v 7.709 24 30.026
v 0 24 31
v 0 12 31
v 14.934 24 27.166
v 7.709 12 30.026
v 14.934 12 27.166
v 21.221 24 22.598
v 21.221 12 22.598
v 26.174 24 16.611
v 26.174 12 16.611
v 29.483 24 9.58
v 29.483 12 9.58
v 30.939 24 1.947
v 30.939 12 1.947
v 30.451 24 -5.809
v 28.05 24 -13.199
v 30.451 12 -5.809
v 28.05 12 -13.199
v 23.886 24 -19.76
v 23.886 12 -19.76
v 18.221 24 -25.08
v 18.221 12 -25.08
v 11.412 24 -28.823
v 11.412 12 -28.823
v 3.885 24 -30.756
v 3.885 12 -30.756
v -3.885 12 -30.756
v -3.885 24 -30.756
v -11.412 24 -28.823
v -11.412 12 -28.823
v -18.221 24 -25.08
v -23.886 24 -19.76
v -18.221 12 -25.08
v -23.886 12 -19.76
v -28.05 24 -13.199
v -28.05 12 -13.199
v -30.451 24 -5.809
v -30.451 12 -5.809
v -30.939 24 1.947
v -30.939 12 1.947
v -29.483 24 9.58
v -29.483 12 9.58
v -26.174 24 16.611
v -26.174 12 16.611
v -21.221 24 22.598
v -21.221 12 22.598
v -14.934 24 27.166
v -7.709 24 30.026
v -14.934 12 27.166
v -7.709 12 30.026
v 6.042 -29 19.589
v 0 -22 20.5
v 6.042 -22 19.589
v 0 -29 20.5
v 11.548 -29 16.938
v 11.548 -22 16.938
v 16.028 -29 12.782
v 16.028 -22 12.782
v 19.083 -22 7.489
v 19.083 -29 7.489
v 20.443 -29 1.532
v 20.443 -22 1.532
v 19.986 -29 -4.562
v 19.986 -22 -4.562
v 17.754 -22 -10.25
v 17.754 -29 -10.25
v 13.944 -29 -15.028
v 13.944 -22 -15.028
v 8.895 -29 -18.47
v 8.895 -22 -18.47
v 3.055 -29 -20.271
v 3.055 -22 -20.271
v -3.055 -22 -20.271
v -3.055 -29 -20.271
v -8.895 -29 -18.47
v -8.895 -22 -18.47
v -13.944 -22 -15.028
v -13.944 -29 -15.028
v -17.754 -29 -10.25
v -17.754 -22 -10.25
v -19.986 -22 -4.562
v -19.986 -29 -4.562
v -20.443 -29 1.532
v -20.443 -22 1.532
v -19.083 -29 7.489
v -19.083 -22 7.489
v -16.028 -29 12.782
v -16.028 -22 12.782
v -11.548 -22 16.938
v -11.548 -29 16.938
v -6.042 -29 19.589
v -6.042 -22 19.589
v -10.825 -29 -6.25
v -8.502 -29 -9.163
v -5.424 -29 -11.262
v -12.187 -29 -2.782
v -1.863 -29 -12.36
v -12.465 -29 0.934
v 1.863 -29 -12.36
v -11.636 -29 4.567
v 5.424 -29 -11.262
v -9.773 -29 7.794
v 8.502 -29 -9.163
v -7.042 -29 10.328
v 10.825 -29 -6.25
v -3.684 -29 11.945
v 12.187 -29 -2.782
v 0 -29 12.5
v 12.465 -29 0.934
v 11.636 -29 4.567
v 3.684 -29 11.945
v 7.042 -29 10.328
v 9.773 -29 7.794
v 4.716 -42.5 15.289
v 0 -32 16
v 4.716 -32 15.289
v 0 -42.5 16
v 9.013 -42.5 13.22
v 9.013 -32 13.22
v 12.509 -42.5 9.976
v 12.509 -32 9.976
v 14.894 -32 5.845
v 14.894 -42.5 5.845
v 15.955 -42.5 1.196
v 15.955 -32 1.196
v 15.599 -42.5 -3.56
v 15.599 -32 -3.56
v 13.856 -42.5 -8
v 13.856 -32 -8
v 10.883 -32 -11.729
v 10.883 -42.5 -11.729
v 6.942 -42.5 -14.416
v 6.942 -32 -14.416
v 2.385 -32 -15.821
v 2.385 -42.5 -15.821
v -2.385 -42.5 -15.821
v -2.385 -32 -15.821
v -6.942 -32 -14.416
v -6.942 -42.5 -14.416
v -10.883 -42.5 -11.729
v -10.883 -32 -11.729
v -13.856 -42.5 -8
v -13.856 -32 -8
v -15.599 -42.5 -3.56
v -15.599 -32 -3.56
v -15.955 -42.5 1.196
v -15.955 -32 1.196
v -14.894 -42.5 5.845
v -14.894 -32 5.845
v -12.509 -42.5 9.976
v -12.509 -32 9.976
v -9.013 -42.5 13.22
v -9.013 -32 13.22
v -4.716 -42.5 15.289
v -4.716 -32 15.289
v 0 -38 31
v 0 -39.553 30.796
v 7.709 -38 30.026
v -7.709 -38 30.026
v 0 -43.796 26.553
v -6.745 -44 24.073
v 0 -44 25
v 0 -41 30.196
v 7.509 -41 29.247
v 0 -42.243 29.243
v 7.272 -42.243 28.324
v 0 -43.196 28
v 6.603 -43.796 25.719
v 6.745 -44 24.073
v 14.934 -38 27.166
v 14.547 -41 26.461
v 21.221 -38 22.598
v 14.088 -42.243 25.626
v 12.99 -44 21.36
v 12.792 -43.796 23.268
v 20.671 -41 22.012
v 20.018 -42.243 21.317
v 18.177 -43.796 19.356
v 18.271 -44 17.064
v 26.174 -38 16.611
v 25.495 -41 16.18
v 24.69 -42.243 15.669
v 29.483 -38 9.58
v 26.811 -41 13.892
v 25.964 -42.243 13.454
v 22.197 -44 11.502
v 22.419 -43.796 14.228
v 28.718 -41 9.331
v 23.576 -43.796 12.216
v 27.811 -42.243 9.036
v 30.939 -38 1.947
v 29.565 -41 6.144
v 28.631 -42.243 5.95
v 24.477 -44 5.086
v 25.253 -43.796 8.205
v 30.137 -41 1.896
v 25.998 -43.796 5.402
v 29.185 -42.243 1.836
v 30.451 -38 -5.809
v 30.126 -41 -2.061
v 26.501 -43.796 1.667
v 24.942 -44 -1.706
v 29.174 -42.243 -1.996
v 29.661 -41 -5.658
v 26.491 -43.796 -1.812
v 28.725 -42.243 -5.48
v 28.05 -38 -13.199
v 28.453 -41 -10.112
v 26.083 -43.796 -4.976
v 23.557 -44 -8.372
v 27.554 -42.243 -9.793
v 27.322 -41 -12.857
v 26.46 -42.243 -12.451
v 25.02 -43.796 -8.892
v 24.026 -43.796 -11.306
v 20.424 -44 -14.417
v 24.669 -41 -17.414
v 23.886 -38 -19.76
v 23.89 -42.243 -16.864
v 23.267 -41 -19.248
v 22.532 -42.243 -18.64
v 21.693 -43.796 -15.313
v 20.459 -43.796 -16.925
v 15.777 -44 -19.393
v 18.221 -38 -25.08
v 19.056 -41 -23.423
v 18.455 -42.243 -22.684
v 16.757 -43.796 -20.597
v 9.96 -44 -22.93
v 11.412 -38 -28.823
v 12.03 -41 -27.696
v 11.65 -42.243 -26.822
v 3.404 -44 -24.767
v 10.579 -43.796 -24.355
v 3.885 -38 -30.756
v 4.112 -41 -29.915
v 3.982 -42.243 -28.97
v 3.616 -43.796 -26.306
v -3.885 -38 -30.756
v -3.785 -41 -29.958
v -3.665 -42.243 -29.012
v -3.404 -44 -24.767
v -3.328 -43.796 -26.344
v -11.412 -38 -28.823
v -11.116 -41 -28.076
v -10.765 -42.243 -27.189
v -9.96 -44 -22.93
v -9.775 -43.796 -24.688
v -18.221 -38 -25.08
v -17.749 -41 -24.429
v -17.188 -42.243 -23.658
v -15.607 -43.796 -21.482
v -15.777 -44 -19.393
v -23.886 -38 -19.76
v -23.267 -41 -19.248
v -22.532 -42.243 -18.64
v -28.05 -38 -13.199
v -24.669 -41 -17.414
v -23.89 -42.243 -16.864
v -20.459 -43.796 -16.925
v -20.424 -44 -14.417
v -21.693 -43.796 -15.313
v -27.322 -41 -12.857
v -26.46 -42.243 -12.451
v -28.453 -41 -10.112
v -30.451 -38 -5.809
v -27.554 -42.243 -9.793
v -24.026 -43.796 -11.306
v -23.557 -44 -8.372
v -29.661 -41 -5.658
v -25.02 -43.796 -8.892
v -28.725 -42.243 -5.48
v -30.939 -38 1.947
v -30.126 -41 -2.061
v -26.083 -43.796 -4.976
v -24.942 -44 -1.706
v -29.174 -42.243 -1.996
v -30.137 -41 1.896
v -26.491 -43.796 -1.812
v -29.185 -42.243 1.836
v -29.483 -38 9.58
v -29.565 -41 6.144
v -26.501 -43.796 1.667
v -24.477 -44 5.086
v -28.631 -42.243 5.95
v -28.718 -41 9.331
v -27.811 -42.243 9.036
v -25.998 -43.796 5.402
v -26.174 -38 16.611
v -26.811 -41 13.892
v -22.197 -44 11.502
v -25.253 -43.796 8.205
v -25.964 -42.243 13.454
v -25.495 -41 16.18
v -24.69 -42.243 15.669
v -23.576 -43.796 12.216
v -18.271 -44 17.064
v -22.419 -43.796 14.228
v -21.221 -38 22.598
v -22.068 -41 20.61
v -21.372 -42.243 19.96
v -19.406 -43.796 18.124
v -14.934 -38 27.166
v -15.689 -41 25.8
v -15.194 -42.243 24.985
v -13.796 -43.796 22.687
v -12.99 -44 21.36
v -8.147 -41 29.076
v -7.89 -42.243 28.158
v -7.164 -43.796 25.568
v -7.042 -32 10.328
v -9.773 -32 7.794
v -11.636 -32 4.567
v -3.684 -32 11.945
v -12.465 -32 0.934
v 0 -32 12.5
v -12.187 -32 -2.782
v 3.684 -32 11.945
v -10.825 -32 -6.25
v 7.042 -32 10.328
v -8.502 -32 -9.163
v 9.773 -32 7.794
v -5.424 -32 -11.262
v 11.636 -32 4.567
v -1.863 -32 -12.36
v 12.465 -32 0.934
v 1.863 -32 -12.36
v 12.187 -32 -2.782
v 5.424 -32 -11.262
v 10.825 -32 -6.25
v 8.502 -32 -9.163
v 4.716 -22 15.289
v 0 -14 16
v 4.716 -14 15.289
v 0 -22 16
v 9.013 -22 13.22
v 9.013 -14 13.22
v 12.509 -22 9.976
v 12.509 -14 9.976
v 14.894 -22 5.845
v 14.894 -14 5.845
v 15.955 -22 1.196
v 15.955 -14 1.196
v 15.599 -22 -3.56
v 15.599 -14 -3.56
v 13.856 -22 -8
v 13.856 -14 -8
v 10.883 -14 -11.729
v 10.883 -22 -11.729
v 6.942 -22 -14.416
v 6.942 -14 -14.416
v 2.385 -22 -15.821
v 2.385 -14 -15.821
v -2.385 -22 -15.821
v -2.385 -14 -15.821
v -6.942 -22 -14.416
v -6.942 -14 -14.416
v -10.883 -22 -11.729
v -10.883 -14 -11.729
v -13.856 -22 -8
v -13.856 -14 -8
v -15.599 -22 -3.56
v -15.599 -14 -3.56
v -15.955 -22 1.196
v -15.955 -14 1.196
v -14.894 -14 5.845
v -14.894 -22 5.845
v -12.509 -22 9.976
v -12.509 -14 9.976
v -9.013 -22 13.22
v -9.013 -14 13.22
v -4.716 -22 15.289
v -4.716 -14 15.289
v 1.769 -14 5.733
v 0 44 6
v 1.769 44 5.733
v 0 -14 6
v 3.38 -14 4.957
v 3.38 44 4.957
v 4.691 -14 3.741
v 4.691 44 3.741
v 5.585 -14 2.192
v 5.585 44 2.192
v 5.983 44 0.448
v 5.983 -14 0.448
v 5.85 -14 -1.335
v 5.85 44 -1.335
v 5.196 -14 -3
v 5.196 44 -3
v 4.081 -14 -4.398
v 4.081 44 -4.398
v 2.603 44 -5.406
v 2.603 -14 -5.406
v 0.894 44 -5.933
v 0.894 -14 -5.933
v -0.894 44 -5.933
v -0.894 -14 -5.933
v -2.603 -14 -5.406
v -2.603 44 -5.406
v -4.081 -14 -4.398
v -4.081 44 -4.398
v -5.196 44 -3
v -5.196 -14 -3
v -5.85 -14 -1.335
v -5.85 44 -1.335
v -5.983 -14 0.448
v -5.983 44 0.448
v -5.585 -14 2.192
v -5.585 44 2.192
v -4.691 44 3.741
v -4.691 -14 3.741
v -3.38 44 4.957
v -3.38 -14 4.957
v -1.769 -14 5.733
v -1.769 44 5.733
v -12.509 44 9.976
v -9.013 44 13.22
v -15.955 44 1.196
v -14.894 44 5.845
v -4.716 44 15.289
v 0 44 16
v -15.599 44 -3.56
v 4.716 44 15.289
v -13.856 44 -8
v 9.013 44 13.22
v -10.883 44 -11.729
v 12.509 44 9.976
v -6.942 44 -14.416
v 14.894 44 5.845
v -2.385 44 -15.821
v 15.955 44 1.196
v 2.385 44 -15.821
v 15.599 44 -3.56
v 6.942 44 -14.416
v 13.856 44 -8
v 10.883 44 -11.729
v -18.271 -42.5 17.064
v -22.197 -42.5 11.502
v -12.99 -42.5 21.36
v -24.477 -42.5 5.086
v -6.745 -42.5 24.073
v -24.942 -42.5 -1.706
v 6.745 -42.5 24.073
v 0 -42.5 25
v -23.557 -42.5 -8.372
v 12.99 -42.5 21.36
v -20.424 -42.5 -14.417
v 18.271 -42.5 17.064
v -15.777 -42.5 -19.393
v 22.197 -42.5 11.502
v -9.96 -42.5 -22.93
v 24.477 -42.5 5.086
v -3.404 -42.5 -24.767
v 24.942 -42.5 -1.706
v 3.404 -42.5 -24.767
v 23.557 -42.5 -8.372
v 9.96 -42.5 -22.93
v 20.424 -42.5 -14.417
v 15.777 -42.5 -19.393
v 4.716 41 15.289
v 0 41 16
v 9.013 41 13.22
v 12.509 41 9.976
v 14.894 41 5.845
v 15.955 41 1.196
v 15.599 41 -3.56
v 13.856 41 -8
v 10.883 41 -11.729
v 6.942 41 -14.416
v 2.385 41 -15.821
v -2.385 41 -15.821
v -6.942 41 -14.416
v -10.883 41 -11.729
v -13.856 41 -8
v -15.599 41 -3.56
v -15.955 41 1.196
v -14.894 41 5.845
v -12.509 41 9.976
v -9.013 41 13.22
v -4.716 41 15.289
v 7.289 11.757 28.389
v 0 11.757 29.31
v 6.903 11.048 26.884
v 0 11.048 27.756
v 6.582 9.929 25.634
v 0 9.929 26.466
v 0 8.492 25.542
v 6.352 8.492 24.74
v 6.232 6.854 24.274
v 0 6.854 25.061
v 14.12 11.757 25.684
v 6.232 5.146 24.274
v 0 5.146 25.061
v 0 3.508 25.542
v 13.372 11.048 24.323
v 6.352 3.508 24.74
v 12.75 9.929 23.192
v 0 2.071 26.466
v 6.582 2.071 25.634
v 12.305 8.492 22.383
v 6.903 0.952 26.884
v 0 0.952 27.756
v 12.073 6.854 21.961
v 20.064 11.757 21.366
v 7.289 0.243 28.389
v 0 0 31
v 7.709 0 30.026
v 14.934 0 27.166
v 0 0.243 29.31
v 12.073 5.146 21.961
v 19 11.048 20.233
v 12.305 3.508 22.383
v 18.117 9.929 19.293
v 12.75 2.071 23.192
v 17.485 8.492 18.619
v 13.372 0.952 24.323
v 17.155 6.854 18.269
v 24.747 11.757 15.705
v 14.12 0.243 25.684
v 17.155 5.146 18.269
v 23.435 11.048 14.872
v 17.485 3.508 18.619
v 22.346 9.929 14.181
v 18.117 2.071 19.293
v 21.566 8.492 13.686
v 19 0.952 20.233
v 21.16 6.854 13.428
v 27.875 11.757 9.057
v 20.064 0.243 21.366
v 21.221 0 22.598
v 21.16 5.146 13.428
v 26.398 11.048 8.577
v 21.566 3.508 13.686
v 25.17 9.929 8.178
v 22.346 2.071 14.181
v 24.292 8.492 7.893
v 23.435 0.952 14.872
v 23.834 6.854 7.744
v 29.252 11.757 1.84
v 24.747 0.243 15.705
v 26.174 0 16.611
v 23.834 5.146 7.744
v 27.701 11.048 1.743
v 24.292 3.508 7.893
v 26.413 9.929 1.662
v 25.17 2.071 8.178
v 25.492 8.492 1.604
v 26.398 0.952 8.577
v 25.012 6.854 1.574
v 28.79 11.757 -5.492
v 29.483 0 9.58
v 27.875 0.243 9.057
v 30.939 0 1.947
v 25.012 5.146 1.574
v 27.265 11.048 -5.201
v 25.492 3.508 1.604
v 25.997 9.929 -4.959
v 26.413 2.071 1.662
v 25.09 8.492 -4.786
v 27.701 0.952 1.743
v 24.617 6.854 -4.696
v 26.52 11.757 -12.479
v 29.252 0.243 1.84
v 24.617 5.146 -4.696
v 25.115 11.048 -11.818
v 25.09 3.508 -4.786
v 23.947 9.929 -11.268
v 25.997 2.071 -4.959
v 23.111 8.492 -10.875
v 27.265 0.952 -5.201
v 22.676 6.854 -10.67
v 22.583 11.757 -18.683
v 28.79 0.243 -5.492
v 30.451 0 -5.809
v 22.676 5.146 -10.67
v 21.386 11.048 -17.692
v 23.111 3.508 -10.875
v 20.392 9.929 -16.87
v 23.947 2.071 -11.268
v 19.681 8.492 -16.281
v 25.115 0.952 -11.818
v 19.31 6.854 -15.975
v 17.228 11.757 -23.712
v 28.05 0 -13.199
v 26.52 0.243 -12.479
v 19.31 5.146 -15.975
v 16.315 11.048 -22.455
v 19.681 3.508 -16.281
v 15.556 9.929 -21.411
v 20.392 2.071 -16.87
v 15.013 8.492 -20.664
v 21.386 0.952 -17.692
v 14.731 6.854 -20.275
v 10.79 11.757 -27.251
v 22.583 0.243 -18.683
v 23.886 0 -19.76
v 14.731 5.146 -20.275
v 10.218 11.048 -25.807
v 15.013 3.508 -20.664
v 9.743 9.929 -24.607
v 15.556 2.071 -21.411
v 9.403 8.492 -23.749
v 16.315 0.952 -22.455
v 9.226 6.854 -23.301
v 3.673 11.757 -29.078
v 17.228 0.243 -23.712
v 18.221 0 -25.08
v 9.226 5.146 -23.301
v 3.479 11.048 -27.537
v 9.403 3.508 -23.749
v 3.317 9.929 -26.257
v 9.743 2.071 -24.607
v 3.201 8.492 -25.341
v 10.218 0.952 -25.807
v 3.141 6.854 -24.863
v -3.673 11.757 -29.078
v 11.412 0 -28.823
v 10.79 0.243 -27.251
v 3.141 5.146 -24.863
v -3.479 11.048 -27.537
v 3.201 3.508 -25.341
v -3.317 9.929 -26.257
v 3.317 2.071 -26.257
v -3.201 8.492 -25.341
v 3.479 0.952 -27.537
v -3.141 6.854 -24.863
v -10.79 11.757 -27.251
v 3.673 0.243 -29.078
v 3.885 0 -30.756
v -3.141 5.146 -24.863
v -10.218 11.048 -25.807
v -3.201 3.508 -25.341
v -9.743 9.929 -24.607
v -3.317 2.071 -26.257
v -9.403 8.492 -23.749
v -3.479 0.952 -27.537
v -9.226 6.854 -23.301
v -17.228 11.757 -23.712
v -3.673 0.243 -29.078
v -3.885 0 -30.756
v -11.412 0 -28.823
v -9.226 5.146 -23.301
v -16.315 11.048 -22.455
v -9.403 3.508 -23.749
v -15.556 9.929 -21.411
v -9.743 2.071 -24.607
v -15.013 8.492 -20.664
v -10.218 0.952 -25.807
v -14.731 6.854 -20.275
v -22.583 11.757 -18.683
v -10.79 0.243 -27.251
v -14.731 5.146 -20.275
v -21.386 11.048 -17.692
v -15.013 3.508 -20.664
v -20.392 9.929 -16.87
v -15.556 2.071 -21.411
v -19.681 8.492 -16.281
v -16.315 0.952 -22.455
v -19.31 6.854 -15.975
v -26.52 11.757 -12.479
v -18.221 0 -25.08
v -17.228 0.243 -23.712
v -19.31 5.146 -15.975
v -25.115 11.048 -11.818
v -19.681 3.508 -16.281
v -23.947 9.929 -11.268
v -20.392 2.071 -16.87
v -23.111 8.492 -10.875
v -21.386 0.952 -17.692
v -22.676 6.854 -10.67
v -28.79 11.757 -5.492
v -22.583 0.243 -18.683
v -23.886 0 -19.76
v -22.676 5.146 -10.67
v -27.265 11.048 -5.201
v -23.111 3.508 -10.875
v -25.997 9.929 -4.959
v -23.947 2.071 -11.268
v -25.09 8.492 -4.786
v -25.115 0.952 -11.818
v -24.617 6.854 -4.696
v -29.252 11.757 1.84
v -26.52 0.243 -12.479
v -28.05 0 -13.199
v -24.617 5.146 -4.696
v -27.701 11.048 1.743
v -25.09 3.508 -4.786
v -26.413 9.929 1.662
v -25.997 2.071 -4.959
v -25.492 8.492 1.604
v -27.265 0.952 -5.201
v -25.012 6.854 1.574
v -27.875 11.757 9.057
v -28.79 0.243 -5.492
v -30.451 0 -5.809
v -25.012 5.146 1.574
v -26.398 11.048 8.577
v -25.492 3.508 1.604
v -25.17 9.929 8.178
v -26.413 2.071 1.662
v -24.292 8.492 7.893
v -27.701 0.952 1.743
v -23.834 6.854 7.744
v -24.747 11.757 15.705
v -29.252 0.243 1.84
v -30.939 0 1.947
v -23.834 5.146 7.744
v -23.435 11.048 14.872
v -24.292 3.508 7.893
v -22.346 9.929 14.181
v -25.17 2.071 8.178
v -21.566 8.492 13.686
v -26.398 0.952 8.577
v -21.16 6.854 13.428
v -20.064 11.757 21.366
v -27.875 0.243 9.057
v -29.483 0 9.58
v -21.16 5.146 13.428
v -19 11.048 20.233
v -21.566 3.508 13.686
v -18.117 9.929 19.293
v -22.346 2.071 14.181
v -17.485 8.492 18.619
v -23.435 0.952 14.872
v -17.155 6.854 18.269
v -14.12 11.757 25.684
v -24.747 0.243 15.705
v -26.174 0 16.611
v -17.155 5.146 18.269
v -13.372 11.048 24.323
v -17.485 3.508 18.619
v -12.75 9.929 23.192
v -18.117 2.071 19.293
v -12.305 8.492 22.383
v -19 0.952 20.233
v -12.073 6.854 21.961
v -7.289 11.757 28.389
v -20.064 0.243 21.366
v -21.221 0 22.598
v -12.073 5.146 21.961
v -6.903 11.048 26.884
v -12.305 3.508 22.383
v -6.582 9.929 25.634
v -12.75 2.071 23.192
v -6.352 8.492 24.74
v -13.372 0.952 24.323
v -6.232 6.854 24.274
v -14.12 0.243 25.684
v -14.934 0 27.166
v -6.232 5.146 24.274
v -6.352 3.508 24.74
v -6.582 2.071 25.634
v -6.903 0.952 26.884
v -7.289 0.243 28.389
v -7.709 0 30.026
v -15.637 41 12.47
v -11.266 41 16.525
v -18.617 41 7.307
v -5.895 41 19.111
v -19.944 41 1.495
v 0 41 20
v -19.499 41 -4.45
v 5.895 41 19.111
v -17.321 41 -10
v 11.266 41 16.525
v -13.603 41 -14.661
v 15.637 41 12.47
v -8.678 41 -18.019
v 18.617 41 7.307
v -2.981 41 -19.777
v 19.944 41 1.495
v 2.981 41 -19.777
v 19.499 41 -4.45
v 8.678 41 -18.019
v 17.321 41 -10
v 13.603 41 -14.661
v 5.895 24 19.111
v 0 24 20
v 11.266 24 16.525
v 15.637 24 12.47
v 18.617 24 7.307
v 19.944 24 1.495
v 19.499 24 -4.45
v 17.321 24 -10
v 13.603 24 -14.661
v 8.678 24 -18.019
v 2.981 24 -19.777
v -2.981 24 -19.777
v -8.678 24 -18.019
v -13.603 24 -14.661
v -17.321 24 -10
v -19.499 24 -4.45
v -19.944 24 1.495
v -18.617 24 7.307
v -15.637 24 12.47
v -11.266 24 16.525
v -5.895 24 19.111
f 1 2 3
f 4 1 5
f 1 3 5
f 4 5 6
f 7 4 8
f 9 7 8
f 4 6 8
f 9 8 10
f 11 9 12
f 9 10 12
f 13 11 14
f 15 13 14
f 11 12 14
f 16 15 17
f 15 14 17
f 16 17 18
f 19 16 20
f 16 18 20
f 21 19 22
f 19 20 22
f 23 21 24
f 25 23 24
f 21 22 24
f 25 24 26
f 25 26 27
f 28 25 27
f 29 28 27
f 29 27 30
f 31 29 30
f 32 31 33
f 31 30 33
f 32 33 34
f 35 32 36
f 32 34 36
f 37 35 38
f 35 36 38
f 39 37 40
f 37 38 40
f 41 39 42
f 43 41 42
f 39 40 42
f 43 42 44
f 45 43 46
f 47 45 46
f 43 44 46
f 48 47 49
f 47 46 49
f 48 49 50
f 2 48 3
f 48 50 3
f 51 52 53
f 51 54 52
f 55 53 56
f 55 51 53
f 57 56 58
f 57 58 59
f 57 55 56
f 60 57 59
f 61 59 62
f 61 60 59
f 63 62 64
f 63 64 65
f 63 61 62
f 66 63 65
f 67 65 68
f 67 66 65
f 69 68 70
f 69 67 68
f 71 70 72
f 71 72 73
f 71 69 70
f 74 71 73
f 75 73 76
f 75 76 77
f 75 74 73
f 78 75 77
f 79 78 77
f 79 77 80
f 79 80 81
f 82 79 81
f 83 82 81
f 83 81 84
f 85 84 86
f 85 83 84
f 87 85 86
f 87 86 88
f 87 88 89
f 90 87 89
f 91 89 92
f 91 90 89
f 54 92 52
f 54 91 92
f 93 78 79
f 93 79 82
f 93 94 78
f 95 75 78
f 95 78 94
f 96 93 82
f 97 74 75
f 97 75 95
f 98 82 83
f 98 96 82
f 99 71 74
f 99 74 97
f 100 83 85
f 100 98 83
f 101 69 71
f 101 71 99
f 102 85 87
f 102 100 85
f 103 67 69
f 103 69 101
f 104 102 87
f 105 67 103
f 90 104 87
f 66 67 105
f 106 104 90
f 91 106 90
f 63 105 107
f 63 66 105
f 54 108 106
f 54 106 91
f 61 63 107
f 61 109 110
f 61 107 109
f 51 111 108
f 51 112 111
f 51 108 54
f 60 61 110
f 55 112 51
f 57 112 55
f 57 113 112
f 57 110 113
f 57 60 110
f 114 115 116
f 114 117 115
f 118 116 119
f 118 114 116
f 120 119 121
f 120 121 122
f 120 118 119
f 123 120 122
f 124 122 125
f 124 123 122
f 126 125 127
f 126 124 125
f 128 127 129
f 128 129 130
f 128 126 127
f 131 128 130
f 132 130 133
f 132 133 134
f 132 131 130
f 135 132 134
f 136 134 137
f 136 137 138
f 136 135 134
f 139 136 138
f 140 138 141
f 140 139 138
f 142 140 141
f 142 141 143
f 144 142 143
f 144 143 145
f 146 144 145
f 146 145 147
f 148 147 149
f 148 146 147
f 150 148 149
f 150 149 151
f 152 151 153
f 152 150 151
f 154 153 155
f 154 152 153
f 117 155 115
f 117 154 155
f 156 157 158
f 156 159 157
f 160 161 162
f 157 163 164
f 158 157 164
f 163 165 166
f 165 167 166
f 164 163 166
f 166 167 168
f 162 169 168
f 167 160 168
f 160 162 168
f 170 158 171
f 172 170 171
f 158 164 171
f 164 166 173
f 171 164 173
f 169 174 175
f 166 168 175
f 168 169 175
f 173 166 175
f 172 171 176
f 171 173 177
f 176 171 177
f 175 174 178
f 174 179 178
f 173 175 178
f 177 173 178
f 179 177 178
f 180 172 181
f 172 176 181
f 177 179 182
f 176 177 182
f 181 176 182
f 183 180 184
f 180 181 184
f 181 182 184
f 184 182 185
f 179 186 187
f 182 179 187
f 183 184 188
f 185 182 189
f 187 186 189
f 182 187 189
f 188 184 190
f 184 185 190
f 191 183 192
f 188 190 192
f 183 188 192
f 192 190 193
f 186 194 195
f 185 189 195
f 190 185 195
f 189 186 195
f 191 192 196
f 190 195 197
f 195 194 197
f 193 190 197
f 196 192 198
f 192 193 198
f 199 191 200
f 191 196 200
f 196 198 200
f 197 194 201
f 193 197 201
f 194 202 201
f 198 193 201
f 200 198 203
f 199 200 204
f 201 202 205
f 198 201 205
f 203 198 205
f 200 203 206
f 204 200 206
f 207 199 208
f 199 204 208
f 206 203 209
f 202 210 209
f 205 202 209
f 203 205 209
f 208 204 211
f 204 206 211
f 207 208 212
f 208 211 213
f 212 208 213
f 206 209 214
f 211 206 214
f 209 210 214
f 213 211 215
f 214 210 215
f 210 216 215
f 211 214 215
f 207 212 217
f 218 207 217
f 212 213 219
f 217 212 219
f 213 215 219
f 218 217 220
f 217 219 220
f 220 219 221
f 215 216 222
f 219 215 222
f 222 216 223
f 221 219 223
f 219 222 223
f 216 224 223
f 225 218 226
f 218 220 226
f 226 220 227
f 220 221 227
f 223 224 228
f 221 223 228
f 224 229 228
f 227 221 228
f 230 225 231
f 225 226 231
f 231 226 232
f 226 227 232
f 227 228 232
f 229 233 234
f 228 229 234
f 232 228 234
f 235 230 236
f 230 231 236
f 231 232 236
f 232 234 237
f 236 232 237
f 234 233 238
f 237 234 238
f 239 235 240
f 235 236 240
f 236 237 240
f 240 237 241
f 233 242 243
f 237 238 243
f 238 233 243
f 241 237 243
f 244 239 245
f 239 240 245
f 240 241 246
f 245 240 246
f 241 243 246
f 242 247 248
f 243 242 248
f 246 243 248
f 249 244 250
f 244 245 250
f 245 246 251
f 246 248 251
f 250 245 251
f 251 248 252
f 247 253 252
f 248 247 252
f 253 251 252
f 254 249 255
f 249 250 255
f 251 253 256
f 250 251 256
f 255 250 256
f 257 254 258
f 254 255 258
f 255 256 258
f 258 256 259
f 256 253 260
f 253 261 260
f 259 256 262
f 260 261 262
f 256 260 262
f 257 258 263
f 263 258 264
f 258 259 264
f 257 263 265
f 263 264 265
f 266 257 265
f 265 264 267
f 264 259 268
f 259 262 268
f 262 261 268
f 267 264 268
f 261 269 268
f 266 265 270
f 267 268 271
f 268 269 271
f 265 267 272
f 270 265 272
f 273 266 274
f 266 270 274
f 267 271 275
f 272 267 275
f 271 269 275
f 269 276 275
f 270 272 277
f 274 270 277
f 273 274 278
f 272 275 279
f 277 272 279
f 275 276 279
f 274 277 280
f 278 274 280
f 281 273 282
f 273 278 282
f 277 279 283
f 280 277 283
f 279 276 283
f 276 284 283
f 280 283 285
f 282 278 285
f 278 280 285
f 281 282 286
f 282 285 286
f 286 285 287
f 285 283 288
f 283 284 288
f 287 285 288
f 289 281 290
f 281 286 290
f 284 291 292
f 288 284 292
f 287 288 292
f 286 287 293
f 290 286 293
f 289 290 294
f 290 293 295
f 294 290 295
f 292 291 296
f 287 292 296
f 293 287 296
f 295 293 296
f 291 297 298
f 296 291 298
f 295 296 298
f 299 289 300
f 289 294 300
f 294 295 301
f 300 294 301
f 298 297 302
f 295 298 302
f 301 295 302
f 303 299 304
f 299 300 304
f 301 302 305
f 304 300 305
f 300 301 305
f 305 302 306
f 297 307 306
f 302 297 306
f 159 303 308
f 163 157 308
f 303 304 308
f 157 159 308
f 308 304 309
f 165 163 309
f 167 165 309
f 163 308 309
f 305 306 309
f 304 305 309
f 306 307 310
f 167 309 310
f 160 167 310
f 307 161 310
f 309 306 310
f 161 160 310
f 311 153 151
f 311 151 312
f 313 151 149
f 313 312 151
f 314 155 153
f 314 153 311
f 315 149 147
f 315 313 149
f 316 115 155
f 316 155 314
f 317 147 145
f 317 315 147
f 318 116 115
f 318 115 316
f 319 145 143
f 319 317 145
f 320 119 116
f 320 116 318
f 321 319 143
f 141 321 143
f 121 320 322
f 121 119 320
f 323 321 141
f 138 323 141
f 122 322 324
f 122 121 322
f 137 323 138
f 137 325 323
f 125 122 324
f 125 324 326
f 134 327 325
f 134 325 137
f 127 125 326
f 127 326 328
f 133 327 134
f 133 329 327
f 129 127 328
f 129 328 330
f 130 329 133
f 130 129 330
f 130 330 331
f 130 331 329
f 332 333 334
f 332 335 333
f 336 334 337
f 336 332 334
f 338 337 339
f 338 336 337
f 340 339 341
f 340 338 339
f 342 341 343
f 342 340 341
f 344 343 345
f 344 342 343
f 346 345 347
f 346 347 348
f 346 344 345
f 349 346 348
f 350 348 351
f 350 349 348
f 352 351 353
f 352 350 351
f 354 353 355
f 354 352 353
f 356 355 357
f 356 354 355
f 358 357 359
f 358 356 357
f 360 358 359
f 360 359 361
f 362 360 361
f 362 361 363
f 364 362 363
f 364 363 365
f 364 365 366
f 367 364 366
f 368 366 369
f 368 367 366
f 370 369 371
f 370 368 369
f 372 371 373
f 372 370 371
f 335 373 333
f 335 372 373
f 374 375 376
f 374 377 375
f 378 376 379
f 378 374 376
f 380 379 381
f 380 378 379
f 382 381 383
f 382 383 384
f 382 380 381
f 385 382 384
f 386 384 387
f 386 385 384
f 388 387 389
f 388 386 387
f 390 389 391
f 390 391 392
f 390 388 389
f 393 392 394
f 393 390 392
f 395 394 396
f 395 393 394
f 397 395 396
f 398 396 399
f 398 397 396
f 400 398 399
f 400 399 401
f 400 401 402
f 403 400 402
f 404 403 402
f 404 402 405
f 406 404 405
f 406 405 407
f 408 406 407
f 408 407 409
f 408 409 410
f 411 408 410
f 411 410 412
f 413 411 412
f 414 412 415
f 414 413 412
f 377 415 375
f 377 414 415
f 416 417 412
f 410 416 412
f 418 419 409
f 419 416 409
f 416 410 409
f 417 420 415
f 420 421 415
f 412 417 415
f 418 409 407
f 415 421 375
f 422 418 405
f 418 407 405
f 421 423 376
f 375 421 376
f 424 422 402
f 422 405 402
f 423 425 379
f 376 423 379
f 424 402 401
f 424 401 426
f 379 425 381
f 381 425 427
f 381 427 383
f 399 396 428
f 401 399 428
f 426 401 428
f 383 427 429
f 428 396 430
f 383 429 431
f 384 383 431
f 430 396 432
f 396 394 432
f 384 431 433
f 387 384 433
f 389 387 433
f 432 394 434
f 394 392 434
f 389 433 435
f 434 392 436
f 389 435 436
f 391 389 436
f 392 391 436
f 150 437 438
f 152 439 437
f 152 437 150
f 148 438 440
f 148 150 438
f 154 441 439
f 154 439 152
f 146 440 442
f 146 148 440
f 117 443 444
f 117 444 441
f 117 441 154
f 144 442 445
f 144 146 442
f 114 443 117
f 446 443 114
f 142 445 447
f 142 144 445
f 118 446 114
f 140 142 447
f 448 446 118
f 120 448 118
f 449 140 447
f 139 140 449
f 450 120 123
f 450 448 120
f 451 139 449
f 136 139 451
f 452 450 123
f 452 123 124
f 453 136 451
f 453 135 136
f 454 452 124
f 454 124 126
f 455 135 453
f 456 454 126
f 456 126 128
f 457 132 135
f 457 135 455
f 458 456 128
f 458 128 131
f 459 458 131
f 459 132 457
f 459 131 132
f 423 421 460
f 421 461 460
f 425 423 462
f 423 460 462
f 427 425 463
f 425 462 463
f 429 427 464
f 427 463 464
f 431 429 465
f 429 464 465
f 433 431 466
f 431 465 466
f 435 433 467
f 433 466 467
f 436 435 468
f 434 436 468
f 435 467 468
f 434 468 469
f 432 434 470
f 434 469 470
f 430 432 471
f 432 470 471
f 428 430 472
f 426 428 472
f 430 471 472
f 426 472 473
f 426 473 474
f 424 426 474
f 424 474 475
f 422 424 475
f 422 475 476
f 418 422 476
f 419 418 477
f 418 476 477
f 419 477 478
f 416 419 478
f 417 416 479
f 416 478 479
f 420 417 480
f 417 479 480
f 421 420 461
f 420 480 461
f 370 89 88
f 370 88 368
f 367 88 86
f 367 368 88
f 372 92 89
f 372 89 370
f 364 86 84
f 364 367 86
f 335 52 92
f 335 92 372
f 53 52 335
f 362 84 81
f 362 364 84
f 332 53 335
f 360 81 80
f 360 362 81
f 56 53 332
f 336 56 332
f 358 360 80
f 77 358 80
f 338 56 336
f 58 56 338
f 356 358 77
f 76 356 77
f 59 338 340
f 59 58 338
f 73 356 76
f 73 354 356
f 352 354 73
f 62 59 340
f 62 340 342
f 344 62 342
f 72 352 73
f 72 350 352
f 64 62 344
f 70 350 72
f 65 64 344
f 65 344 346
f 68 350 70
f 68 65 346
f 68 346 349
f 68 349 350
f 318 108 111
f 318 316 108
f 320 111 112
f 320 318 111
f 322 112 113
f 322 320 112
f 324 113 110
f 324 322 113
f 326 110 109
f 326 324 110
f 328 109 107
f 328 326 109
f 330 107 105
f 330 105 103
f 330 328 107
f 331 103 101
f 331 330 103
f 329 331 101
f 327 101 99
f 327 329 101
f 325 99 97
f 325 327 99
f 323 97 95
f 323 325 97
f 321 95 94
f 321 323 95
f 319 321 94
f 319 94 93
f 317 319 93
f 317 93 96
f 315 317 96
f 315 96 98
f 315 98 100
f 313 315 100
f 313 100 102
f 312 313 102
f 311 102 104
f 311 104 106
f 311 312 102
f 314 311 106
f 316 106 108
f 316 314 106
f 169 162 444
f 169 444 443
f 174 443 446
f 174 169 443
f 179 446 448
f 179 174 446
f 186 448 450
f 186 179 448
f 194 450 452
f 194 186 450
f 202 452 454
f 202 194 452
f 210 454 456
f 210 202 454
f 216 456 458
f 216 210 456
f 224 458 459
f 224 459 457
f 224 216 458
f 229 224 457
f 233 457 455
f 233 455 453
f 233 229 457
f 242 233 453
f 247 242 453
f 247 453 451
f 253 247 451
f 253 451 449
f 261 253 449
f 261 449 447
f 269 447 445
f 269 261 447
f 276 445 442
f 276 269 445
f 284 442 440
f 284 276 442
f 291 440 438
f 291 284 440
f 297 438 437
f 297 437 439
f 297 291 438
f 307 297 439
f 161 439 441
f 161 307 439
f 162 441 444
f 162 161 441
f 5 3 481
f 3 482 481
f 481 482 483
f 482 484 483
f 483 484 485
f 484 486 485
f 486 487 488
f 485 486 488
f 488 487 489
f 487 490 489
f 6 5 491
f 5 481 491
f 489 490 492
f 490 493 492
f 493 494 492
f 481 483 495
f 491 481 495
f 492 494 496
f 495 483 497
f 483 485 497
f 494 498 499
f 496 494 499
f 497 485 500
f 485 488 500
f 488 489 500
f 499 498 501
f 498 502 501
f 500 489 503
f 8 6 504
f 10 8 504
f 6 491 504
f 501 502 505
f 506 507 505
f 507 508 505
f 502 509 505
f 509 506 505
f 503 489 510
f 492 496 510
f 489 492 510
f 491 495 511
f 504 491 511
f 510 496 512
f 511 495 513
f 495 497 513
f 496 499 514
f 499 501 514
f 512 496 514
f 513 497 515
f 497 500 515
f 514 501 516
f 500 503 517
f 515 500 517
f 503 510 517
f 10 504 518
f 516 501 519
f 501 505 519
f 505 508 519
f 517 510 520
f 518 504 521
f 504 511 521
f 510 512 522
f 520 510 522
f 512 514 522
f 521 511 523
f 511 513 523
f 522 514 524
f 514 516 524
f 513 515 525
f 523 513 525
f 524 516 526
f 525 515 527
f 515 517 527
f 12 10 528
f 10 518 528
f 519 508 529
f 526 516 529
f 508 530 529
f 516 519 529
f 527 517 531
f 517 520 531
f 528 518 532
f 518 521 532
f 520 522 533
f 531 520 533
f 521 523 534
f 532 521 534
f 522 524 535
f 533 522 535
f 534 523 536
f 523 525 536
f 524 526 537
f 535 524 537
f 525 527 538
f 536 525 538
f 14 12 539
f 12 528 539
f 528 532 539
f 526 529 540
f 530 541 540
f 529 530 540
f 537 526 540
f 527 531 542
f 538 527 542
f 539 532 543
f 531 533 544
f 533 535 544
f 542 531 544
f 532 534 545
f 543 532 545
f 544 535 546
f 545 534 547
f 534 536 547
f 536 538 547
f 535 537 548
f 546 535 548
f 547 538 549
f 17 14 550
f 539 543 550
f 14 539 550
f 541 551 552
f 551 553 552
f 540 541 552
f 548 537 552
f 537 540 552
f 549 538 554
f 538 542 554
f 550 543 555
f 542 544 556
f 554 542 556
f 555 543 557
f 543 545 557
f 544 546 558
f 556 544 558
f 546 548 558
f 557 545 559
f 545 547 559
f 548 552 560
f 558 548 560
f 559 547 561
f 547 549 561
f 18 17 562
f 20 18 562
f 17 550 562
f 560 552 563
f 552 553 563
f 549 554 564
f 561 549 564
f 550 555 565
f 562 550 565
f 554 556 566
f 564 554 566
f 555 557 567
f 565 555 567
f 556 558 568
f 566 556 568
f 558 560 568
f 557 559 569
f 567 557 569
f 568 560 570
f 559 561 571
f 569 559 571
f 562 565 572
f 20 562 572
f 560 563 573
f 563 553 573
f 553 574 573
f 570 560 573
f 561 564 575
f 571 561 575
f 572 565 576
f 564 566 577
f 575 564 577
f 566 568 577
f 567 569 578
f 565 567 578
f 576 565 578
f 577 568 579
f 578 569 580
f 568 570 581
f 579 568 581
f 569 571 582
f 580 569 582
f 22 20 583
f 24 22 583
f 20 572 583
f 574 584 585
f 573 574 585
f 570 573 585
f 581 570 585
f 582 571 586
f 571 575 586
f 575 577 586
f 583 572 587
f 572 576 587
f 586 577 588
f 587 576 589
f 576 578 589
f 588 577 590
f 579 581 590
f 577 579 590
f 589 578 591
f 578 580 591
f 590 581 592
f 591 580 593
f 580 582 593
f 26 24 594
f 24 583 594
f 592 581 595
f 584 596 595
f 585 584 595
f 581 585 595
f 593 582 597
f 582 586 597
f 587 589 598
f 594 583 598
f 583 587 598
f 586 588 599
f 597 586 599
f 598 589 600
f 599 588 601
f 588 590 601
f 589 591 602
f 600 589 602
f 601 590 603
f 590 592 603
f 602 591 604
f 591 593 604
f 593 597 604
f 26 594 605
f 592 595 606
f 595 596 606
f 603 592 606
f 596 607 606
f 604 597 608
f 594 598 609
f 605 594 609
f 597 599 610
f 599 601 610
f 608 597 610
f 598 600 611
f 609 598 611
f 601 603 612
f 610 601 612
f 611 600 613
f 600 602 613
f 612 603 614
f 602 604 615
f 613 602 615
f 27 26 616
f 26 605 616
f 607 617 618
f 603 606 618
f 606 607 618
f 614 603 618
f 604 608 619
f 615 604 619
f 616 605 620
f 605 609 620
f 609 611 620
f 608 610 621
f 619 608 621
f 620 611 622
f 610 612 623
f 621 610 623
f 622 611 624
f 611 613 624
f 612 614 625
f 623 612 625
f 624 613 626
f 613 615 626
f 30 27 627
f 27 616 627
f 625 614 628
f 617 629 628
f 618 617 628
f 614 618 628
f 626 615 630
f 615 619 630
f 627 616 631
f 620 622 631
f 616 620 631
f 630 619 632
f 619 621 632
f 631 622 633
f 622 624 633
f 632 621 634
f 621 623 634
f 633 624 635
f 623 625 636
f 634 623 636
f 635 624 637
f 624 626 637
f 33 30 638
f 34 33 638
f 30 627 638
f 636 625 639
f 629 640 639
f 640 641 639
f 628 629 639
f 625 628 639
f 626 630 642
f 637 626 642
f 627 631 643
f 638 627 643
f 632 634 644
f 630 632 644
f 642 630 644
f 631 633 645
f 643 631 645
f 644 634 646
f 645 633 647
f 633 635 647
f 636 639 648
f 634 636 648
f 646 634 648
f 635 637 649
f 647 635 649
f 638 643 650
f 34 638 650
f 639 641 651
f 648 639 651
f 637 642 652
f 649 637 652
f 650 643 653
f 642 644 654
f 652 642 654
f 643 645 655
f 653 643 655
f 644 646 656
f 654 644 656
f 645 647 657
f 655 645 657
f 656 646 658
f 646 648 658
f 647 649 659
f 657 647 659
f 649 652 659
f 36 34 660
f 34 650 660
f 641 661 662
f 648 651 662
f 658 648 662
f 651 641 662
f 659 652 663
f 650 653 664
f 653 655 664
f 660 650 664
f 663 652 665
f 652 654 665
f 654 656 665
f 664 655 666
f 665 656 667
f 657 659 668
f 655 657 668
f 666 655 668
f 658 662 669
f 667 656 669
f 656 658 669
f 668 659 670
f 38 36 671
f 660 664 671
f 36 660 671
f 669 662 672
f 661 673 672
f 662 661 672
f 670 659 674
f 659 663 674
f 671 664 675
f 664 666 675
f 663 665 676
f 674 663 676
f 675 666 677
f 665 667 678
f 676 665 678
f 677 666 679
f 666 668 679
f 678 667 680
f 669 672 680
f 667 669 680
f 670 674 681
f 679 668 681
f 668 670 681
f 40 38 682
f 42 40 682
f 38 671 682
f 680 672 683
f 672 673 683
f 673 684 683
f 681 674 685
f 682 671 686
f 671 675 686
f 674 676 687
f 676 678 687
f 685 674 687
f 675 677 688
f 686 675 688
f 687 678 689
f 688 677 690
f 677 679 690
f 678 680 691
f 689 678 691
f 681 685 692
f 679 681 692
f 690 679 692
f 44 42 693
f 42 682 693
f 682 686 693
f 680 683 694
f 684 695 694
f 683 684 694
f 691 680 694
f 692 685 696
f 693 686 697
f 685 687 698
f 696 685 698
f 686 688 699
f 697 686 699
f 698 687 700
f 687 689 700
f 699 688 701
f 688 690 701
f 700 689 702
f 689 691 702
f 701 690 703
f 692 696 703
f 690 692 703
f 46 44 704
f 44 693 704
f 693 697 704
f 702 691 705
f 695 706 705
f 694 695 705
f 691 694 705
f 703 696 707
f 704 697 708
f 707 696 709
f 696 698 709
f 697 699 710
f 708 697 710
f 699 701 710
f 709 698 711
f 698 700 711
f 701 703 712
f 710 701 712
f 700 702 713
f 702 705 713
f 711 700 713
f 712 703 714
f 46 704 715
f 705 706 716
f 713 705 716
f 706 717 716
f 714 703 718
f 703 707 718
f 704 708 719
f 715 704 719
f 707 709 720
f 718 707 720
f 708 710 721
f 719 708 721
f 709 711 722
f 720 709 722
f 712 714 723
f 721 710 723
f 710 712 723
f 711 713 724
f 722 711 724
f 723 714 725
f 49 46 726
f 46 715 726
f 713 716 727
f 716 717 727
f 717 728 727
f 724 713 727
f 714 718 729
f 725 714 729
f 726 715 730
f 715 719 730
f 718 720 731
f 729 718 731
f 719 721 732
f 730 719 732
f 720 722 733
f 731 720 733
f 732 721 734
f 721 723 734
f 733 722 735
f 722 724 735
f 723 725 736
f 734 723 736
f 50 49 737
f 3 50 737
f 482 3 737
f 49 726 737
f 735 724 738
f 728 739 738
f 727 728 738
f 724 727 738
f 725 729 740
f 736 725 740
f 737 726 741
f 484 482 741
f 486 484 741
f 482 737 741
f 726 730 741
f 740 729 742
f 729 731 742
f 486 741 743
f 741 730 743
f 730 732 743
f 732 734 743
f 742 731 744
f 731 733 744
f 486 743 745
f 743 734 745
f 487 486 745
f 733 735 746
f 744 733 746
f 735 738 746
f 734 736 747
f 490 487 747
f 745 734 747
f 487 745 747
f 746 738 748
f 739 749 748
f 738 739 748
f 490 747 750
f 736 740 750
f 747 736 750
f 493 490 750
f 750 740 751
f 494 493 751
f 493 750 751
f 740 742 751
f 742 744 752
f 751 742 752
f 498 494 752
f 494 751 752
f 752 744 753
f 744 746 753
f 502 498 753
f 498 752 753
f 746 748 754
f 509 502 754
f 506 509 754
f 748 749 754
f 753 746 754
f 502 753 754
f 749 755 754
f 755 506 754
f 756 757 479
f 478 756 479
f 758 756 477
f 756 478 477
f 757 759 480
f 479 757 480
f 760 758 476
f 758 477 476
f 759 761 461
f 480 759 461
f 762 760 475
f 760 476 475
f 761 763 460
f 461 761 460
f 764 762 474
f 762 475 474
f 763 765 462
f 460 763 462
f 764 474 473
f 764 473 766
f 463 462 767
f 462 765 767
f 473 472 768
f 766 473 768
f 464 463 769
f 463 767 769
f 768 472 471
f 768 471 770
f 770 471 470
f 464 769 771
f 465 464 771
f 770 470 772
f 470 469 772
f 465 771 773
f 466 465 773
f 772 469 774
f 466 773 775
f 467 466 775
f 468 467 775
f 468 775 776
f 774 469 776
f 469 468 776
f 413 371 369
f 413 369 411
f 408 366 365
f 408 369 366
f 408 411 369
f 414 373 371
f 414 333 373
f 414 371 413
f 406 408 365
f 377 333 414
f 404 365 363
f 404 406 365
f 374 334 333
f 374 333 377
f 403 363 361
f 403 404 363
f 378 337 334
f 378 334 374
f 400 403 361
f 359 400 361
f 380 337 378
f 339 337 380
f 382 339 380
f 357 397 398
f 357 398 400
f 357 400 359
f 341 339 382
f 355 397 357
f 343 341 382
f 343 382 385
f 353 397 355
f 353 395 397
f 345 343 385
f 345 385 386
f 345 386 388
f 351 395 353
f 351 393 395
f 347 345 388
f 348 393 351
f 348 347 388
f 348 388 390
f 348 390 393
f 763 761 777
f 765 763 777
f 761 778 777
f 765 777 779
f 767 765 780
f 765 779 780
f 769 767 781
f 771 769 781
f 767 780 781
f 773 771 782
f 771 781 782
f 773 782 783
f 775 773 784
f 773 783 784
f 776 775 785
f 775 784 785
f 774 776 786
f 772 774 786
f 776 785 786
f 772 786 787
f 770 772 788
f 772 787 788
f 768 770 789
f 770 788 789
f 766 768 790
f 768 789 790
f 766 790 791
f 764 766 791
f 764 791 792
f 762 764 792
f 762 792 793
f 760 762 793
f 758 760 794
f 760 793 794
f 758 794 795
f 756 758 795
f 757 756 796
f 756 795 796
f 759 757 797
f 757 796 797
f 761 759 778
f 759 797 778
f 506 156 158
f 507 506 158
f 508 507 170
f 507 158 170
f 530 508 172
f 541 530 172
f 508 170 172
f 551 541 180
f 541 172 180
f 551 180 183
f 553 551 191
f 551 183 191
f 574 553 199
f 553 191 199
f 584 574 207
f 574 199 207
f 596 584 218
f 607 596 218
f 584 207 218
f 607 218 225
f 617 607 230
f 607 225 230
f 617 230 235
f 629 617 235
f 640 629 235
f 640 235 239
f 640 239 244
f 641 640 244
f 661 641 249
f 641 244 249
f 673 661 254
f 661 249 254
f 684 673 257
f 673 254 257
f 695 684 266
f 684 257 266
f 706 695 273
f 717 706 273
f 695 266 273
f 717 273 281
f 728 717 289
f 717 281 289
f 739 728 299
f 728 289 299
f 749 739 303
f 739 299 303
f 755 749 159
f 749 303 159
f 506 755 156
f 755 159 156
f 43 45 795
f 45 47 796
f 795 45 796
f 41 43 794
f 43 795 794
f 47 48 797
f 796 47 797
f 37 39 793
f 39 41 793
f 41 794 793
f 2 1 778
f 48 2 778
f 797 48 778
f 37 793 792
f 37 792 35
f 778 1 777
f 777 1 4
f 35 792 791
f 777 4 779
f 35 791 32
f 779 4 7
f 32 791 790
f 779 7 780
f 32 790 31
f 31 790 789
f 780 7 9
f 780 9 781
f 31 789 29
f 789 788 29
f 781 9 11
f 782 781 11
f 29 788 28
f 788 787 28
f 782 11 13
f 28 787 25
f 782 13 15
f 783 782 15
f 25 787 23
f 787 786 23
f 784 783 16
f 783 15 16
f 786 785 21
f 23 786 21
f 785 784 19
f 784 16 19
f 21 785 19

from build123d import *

# Parameters (mm, degrees)
F2_R = 6


with BuildPart() as f1:
    # F0 (on Right) → F1 (revolve)
    with BuildSketch(Plane.YZ):
        with BuildLine():
            Line((0, 31), (-44, 31))
            Line((-44, 31), (-44, 0))
            Line((-44, 0), (24, 0))
            Line((24, 0), (24, 31))
            Line((24, 31), (12, 31))
            ThreePointArc((12, 31), (6, 25), (0, 31))
        make_face()
    revolve(axis=Axis((0, 4.568492, 0), (0, 1, 0)))

    # F2
    f2_edges = [f1.edges().sort_by_distance(p)[0] for p in [
        (0, -44, -31),
    ]]
    fillet(f2_edges, radius=F2_R)

    # F3 (on Right) → F4 (revolve)
    with BuildSketch(Plane.YZ):
        Polygon((41, 20), (24, 20), (24, 0), (44, 0), (44, 16), (41, 16), align=None)
    revolve(axis=Axis((0, 39.701345, 0), (0, 1, 0)))

    # F5 (on Right) → F6 (revolve, cut)
    with BuildSketch(Plane.YZ):
        Polygon((-42.5, 25), (-44, 25), (-44, 0), (44, 0), (44, 6), (-14, 6), (-14, 16), (-22, 16), (-22, 20.5), (-29, 20.5), (-29, 12.5), (-32, 12.5), (-32, 16), (-42.5, 16), align=None)
    revolve(axis=Axis((0, 2.262007, 0), (0, 1, 0)), mode=Mode.SUBTRACT)


solid = f1.part
